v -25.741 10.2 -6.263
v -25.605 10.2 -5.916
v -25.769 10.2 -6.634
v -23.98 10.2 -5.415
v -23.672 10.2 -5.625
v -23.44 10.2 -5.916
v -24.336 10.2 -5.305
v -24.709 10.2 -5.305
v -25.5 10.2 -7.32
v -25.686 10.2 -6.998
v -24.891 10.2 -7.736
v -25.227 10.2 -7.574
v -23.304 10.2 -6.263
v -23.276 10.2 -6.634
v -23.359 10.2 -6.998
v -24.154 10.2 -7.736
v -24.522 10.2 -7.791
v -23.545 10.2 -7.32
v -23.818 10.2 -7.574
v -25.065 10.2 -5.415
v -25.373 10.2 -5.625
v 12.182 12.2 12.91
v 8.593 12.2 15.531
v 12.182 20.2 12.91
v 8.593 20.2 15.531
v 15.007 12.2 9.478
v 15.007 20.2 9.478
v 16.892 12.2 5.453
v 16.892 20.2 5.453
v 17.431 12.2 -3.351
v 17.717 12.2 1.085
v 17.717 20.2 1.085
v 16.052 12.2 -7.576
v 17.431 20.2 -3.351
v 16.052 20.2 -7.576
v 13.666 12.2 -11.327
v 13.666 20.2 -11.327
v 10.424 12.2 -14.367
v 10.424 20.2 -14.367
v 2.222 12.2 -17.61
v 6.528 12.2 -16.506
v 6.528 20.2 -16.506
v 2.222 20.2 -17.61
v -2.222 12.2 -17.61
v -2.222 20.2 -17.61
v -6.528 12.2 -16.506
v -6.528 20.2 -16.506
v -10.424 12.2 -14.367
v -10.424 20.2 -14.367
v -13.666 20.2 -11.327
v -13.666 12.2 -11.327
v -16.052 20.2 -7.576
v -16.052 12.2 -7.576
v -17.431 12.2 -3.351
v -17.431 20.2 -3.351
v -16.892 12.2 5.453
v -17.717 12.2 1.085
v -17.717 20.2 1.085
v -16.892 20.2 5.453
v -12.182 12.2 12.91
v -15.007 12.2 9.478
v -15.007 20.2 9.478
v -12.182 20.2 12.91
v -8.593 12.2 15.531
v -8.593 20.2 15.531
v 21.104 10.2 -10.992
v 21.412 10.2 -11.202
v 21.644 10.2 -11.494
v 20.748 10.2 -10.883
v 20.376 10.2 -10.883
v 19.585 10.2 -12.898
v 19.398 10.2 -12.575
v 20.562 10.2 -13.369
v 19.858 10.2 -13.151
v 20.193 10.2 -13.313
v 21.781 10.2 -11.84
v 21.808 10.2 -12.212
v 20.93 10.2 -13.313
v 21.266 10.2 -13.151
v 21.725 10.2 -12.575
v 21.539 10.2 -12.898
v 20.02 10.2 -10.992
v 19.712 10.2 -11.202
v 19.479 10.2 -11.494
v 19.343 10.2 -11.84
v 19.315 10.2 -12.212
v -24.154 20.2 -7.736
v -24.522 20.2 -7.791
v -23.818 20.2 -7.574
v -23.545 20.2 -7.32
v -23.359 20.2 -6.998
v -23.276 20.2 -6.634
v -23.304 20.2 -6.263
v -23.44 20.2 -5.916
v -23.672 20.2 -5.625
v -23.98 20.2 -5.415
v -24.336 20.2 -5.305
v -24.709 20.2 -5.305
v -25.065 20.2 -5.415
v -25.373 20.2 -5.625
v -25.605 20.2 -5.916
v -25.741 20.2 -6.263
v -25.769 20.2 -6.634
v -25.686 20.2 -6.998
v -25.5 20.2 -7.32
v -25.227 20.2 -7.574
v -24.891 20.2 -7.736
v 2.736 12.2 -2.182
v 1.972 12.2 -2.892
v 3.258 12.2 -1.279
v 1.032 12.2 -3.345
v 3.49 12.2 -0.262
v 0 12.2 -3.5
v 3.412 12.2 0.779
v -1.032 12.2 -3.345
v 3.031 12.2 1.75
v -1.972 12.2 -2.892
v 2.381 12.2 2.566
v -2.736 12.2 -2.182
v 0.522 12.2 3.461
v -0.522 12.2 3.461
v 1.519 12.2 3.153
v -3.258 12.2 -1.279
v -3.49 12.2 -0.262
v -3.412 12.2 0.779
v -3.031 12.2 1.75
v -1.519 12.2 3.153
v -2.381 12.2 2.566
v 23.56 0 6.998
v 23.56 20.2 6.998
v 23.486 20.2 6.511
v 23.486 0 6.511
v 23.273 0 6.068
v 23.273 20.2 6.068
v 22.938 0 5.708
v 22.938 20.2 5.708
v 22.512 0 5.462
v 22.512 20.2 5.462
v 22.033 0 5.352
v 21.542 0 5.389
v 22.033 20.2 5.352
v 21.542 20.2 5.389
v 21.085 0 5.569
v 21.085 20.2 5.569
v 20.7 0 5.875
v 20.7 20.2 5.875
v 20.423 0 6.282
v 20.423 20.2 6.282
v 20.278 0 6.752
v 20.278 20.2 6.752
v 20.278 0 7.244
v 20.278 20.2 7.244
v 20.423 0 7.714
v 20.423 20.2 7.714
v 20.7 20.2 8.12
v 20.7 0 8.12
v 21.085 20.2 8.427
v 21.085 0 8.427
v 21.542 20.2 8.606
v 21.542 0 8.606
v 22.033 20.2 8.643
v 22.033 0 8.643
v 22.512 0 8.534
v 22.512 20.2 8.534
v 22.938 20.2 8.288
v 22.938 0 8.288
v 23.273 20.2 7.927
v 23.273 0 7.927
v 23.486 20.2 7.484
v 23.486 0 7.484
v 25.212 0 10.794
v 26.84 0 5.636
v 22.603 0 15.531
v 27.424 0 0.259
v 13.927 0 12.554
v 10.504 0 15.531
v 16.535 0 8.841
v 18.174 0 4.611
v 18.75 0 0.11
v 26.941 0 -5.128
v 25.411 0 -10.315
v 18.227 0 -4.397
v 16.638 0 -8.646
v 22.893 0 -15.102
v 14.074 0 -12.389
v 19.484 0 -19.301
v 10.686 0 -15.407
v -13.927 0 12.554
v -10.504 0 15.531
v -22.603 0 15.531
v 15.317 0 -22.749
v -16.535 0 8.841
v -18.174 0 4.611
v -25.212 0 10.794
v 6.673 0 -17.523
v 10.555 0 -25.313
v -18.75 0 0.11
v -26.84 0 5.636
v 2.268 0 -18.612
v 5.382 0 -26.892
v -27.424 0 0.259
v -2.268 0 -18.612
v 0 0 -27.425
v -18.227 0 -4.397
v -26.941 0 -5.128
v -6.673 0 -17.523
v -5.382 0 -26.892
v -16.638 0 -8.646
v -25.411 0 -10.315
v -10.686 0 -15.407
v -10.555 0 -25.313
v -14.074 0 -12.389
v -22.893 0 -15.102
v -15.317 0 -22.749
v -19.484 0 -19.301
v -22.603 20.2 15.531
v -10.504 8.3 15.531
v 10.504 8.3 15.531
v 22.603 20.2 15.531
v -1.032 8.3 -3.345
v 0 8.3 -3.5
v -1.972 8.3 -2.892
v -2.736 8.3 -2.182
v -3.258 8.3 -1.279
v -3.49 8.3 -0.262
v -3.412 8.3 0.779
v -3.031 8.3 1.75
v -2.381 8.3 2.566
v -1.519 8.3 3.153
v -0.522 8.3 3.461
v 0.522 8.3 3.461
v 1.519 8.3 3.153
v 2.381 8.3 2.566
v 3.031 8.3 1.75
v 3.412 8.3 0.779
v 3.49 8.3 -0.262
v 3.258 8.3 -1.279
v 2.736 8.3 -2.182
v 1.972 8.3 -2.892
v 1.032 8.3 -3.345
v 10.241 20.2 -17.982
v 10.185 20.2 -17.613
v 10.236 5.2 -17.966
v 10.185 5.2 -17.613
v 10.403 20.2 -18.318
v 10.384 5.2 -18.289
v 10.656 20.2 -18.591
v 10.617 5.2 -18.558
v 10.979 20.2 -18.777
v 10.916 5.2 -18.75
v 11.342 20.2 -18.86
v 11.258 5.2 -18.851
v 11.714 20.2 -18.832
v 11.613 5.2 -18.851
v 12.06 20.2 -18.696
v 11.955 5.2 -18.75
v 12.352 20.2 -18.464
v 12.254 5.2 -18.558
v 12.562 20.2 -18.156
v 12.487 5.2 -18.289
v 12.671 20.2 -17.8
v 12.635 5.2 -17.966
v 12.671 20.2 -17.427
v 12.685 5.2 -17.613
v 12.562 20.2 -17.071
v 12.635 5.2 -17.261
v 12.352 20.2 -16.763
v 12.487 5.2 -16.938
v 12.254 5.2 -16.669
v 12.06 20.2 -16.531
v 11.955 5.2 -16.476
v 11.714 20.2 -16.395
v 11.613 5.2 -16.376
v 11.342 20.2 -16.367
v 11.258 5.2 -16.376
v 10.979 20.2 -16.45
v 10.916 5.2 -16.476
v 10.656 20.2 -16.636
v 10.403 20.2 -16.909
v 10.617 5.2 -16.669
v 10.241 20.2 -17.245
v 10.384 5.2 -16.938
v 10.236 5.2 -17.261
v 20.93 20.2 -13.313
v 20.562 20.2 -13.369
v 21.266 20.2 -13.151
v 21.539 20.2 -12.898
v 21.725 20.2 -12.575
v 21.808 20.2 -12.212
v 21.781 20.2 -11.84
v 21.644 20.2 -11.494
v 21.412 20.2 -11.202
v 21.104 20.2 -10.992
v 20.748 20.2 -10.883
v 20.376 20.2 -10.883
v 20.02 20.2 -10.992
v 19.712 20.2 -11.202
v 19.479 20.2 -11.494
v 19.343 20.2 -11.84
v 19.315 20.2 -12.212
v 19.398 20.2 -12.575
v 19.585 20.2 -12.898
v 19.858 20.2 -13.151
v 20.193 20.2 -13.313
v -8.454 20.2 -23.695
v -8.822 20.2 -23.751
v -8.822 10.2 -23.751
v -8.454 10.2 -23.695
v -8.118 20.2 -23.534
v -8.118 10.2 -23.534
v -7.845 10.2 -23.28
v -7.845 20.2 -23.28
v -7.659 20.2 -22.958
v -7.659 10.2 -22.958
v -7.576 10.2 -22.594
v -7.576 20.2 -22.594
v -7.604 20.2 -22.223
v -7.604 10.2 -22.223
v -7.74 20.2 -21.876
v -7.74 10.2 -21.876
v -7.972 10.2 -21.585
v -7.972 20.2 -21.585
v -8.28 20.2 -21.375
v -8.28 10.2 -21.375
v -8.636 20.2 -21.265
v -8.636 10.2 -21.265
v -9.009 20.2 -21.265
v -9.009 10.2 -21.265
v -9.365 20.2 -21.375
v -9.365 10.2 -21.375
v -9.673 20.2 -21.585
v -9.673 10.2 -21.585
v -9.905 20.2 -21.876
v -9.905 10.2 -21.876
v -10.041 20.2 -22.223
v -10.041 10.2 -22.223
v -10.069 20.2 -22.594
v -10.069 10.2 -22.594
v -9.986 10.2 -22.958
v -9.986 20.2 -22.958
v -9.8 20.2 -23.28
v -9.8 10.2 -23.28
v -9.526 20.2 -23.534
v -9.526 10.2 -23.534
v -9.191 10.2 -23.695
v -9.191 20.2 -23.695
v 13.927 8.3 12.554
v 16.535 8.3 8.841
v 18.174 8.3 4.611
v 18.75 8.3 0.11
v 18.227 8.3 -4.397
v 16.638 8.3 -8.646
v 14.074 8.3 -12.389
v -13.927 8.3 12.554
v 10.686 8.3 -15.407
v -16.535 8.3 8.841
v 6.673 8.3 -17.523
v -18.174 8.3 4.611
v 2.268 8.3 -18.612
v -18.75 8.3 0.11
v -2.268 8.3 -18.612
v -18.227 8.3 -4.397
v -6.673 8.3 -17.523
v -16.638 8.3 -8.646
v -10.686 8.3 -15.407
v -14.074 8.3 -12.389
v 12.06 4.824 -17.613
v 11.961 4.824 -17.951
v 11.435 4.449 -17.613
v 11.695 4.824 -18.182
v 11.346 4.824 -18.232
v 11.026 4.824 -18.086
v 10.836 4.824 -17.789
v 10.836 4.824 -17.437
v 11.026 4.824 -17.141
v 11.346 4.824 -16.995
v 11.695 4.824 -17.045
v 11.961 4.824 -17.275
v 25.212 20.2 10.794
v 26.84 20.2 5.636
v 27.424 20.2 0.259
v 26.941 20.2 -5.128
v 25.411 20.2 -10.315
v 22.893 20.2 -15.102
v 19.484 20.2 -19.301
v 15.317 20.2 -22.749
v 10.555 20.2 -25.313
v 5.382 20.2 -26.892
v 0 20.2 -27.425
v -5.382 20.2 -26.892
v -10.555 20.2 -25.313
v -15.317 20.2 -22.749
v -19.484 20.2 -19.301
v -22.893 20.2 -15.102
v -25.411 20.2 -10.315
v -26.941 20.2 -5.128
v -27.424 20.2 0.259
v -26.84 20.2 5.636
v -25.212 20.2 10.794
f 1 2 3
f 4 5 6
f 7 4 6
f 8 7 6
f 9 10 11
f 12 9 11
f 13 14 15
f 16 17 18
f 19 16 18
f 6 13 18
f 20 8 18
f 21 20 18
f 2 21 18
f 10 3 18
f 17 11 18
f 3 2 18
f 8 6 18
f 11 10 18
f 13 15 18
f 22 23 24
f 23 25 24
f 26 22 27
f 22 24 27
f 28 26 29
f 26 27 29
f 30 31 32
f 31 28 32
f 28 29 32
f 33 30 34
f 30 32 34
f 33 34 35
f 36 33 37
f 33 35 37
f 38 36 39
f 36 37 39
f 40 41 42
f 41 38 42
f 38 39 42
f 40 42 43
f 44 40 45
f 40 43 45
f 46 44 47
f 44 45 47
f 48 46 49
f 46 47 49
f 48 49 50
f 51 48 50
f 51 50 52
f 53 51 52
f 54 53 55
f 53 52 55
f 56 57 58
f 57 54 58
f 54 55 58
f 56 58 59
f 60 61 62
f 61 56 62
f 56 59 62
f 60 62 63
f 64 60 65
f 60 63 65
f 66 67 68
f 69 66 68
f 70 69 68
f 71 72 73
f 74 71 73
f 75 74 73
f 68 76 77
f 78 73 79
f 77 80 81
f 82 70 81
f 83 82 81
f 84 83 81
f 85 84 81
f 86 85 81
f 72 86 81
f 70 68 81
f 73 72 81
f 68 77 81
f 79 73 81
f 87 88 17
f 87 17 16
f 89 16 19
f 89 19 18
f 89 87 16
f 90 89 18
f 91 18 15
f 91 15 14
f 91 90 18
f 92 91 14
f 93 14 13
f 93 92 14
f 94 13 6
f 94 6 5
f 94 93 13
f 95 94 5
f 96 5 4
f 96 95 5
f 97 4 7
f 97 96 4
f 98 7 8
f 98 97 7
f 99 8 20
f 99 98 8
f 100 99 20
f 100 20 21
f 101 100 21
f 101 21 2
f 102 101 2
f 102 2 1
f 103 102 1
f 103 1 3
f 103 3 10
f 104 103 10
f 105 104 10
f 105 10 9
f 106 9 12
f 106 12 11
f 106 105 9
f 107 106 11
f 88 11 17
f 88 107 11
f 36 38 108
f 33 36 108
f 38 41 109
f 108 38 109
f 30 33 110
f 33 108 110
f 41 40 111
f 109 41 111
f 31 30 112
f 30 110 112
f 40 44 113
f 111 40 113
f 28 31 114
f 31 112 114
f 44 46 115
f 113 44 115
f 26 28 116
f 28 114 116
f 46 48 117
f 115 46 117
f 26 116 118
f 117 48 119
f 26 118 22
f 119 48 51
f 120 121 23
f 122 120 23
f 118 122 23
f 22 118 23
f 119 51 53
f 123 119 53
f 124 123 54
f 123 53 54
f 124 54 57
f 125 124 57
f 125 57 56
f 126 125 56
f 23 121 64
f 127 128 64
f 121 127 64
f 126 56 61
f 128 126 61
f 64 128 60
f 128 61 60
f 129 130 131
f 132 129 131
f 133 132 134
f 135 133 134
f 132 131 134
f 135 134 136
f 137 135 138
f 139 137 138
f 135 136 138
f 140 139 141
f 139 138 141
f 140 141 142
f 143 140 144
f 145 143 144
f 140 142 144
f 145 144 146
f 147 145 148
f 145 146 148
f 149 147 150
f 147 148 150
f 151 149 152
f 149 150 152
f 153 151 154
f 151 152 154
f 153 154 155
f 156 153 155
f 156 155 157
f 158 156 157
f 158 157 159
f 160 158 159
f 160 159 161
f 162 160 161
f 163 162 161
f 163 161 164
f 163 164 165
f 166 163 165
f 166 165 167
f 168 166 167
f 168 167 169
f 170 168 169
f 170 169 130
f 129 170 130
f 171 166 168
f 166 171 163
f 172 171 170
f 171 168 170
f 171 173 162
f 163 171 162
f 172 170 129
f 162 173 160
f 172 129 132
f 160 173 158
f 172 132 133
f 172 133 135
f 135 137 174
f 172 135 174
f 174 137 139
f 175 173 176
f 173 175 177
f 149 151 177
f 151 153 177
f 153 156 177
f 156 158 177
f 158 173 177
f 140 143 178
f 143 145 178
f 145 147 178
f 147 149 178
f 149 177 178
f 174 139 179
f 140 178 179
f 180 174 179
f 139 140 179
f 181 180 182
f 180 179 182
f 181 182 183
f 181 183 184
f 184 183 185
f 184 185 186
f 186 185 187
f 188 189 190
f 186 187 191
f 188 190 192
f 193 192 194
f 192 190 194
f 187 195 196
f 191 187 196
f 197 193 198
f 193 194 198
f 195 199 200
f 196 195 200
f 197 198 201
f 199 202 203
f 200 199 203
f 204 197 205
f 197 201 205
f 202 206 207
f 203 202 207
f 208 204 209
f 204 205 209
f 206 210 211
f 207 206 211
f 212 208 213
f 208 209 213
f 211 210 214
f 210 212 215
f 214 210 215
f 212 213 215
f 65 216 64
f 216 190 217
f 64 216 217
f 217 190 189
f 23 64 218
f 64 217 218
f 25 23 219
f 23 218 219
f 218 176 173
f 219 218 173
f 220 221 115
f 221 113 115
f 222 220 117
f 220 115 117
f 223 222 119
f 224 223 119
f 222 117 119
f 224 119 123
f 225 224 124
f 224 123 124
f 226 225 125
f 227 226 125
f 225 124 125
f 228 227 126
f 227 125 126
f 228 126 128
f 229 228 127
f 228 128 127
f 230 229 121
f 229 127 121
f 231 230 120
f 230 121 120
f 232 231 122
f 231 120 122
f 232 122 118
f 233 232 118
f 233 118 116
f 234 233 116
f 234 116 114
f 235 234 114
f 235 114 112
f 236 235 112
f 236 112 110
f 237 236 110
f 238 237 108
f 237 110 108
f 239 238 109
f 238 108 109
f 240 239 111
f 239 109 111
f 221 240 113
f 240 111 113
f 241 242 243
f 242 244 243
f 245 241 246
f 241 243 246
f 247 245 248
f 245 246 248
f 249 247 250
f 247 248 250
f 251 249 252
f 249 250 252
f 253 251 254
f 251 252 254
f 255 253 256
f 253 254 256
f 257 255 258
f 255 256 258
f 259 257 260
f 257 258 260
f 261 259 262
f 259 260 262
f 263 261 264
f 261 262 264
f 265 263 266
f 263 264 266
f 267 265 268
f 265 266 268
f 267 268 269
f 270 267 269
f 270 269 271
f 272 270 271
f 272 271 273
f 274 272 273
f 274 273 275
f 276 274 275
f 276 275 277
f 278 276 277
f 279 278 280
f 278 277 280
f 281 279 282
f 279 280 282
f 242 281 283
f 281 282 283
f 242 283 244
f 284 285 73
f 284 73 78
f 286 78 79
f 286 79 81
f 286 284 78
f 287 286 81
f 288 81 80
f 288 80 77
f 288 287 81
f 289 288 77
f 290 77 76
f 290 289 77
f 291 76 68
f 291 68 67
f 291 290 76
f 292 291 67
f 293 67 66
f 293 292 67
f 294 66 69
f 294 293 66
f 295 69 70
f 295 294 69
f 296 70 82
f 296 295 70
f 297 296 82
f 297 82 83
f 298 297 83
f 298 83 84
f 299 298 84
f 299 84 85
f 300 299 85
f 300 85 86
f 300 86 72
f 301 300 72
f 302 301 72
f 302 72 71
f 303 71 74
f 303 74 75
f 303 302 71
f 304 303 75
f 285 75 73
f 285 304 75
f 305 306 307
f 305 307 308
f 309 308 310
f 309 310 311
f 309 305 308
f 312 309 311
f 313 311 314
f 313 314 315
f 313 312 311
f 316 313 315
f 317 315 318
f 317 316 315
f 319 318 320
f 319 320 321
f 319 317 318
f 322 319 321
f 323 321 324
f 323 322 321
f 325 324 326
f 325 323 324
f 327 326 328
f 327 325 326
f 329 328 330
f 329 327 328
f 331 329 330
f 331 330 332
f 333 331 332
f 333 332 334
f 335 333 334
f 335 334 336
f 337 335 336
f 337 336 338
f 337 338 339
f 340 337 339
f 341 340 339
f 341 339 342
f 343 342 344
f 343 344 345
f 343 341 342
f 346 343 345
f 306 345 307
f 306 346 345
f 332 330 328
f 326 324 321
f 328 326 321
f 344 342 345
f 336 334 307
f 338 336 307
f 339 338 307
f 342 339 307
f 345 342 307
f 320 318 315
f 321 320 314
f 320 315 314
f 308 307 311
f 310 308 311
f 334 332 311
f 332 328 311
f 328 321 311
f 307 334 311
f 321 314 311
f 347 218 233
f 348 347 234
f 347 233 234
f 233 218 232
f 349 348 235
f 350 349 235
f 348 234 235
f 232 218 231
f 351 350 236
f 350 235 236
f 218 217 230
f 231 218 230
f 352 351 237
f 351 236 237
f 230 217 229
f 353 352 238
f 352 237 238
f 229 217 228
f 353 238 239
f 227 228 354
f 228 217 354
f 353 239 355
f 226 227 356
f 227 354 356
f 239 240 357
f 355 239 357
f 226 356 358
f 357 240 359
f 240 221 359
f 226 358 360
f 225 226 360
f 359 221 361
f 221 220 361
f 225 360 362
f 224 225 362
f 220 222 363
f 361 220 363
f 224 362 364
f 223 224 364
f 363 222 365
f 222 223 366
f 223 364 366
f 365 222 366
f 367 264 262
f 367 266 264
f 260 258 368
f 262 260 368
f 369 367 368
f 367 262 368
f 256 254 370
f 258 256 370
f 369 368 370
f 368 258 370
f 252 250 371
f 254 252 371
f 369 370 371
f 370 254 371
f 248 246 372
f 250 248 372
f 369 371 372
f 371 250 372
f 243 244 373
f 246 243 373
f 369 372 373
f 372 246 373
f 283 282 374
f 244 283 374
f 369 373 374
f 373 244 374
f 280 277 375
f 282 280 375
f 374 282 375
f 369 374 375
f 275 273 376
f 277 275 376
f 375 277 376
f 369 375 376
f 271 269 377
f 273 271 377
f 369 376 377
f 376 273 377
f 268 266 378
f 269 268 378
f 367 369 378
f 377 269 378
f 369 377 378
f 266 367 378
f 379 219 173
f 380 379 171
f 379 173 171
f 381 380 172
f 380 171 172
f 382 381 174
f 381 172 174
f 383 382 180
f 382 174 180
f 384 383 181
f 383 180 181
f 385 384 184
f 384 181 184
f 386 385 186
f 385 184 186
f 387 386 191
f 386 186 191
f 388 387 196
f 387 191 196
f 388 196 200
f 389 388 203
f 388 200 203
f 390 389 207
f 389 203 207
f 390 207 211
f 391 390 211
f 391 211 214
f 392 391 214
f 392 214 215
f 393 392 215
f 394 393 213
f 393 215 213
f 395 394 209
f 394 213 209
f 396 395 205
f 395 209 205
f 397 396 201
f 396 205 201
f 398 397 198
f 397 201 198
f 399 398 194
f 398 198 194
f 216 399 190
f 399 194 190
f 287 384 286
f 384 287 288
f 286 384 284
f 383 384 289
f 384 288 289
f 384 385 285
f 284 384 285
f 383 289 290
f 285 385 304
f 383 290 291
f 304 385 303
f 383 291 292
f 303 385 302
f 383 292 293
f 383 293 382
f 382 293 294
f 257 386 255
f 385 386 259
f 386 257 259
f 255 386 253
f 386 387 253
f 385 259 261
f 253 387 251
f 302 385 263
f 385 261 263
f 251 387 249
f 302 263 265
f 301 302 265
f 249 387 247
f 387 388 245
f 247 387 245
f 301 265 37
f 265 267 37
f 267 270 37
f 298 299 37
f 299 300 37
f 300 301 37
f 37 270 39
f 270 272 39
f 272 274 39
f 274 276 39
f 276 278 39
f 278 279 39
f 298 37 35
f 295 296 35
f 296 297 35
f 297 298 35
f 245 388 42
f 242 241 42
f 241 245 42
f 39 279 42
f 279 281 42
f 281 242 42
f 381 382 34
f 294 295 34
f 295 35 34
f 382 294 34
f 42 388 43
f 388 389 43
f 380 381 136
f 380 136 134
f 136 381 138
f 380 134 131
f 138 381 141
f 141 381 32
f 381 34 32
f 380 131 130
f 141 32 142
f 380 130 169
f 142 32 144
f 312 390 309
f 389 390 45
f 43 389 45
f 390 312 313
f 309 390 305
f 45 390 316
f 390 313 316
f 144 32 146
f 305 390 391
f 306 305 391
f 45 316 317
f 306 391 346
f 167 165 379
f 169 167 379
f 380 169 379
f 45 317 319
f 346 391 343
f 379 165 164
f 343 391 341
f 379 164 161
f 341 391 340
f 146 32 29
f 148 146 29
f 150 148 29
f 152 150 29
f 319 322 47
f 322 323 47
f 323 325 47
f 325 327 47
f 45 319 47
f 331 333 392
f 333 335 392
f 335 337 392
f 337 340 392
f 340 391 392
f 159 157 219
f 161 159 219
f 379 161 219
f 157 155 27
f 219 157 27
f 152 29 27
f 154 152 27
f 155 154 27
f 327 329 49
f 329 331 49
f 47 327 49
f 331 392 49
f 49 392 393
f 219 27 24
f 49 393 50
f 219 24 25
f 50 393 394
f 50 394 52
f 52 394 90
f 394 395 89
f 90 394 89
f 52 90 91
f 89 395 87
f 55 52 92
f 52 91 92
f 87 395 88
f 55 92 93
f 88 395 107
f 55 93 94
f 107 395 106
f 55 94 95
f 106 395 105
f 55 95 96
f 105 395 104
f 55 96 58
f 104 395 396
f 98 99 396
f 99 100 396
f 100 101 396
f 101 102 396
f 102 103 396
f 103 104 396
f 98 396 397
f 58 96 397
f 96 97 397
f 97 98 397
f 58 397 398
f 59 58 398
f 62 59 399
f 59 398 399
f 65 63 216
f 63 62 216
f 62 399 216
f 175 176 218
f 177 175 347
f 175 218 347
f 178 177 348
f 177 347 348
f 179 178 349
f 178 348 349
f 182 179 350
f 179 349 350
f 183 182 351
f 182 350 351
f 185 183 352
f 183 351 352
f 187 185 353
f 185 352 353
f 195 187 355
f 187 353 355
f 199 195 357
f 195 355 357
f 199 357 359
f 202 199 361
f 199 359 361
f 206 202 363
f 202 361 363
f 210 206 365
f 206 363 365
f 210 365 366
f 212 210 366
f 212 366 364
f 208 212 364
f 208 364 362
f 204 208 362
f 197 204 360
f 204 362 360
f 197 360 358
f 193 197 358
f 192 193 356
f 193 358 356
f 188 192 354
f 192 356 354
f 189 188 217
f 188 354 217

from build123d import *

# Parameters (mm, degrees)
SKETCH_2_W            = 45.206404826
SKETCH_2_H            = 11.893552363
CUT_EXTRUDE_1_DEPTH   = 44.729866796
M3_TAPPED_HOLE1_D     = 2.5
M3_TAPPED_HOLE1_DEPTH = 15
M3_TAPPED_HOLE1_TIP   = 0.751075774
CUT_EXTRUDE_START     = -20.2
SKETCH_6_R            = 1.25
CUT_EXTRUDE_3_DEPTH   = 10
M4X0_7_TAPPED_HOLE1_D = 3.3


with BuildPart() as part:
    # Эскиз1 → Повернуть1 (revolve)
    with BuildSketch(Plane.XY, mode=Mode.PRIVATE) as revolve_1_sk:
        Polygon((-27.425, 0), (-18.75, 0), (-18.75, 8.3), (-3.5, 8.3), (-3.5, 12.2), (-17.75, 12.2), (-17.75, 20.2), (-27.425, 20.2), align=None)
    revolve(revolve_1_sk.sketch.rotate(Axis((0, 0, 0), (0, 1, 0)), 270), axis=Axis((0, 0, 0), (0, 1, 0)))

    # Эскиз2 → Вырез-Вытянуть1 (cut, through all)
    with BuildSketch(Plane.XZ):
        with Locations((0, 21.478223819)):
            Rectangle(SKETCH_2_W, SKETCH_2_H)
    extrude(amount=-CUT_EXTRUDE_1_DEPTH, mode=Mode.SUBTRACT)

    # M3 Tapped Hole1
    with Locations(Plane(origin=(0, 20.2, 0), x_dir=(1, 0, 0), z_dir=(0, 1, 0))):
        with Locations((11.435398966, 17.613394065)):
            Hole(M3_TAPPED_HOLE1_D / 2, depth=M3_TAPPED_HOLE1_DEPTH)
            with Locations((0, 0, -(M3_TAPPED_HOLE1_DEPTH + M3_TAPPED_HOLE1_TIP / 2))):  # 118° drill point
                Cone(0, M3_TAPPED_HOLE1_D / 2, M3_TAPPED_HOLE1_TIP, mode=Mode.SUBTRACT)

    # Эскиз6 → Вырез-Вытянуть3 (cut)
    with BuildSketch(Plane.XZ.offset(CUT_EXTRUDE_START)):
        with Locations(Location((20.561874638, -12.118552363, 0), (0, 0, 270))):
            Circle(SKETCH_6_R)
        with Locations(Location((-8.822328368, -22.500922696, 0), (0, 0, 270))):
            Circle(SKETCH_6_R)
        with Locations(Location((-24.522435774, -6.541065947, 0), (0, 0, 270))):
            Circle(SKETCH_6_R)
    extrude(amount=CUT_EXTRUDE_3_DEPTH, mode=Mode.SUBTRACT)

    # M4x0.7 Tapped Hole1 (through all)
    with Locations(Plane(origin=(0, 0, 0), x_dir=(-1, 0, 0), z_dir=(0, -1, 0))):
        with Locations((-21.909616243, -6.997765079)):
            Hole(M4X0_7_TAPPED_HOLE1_D / 2)


solid = part.part
